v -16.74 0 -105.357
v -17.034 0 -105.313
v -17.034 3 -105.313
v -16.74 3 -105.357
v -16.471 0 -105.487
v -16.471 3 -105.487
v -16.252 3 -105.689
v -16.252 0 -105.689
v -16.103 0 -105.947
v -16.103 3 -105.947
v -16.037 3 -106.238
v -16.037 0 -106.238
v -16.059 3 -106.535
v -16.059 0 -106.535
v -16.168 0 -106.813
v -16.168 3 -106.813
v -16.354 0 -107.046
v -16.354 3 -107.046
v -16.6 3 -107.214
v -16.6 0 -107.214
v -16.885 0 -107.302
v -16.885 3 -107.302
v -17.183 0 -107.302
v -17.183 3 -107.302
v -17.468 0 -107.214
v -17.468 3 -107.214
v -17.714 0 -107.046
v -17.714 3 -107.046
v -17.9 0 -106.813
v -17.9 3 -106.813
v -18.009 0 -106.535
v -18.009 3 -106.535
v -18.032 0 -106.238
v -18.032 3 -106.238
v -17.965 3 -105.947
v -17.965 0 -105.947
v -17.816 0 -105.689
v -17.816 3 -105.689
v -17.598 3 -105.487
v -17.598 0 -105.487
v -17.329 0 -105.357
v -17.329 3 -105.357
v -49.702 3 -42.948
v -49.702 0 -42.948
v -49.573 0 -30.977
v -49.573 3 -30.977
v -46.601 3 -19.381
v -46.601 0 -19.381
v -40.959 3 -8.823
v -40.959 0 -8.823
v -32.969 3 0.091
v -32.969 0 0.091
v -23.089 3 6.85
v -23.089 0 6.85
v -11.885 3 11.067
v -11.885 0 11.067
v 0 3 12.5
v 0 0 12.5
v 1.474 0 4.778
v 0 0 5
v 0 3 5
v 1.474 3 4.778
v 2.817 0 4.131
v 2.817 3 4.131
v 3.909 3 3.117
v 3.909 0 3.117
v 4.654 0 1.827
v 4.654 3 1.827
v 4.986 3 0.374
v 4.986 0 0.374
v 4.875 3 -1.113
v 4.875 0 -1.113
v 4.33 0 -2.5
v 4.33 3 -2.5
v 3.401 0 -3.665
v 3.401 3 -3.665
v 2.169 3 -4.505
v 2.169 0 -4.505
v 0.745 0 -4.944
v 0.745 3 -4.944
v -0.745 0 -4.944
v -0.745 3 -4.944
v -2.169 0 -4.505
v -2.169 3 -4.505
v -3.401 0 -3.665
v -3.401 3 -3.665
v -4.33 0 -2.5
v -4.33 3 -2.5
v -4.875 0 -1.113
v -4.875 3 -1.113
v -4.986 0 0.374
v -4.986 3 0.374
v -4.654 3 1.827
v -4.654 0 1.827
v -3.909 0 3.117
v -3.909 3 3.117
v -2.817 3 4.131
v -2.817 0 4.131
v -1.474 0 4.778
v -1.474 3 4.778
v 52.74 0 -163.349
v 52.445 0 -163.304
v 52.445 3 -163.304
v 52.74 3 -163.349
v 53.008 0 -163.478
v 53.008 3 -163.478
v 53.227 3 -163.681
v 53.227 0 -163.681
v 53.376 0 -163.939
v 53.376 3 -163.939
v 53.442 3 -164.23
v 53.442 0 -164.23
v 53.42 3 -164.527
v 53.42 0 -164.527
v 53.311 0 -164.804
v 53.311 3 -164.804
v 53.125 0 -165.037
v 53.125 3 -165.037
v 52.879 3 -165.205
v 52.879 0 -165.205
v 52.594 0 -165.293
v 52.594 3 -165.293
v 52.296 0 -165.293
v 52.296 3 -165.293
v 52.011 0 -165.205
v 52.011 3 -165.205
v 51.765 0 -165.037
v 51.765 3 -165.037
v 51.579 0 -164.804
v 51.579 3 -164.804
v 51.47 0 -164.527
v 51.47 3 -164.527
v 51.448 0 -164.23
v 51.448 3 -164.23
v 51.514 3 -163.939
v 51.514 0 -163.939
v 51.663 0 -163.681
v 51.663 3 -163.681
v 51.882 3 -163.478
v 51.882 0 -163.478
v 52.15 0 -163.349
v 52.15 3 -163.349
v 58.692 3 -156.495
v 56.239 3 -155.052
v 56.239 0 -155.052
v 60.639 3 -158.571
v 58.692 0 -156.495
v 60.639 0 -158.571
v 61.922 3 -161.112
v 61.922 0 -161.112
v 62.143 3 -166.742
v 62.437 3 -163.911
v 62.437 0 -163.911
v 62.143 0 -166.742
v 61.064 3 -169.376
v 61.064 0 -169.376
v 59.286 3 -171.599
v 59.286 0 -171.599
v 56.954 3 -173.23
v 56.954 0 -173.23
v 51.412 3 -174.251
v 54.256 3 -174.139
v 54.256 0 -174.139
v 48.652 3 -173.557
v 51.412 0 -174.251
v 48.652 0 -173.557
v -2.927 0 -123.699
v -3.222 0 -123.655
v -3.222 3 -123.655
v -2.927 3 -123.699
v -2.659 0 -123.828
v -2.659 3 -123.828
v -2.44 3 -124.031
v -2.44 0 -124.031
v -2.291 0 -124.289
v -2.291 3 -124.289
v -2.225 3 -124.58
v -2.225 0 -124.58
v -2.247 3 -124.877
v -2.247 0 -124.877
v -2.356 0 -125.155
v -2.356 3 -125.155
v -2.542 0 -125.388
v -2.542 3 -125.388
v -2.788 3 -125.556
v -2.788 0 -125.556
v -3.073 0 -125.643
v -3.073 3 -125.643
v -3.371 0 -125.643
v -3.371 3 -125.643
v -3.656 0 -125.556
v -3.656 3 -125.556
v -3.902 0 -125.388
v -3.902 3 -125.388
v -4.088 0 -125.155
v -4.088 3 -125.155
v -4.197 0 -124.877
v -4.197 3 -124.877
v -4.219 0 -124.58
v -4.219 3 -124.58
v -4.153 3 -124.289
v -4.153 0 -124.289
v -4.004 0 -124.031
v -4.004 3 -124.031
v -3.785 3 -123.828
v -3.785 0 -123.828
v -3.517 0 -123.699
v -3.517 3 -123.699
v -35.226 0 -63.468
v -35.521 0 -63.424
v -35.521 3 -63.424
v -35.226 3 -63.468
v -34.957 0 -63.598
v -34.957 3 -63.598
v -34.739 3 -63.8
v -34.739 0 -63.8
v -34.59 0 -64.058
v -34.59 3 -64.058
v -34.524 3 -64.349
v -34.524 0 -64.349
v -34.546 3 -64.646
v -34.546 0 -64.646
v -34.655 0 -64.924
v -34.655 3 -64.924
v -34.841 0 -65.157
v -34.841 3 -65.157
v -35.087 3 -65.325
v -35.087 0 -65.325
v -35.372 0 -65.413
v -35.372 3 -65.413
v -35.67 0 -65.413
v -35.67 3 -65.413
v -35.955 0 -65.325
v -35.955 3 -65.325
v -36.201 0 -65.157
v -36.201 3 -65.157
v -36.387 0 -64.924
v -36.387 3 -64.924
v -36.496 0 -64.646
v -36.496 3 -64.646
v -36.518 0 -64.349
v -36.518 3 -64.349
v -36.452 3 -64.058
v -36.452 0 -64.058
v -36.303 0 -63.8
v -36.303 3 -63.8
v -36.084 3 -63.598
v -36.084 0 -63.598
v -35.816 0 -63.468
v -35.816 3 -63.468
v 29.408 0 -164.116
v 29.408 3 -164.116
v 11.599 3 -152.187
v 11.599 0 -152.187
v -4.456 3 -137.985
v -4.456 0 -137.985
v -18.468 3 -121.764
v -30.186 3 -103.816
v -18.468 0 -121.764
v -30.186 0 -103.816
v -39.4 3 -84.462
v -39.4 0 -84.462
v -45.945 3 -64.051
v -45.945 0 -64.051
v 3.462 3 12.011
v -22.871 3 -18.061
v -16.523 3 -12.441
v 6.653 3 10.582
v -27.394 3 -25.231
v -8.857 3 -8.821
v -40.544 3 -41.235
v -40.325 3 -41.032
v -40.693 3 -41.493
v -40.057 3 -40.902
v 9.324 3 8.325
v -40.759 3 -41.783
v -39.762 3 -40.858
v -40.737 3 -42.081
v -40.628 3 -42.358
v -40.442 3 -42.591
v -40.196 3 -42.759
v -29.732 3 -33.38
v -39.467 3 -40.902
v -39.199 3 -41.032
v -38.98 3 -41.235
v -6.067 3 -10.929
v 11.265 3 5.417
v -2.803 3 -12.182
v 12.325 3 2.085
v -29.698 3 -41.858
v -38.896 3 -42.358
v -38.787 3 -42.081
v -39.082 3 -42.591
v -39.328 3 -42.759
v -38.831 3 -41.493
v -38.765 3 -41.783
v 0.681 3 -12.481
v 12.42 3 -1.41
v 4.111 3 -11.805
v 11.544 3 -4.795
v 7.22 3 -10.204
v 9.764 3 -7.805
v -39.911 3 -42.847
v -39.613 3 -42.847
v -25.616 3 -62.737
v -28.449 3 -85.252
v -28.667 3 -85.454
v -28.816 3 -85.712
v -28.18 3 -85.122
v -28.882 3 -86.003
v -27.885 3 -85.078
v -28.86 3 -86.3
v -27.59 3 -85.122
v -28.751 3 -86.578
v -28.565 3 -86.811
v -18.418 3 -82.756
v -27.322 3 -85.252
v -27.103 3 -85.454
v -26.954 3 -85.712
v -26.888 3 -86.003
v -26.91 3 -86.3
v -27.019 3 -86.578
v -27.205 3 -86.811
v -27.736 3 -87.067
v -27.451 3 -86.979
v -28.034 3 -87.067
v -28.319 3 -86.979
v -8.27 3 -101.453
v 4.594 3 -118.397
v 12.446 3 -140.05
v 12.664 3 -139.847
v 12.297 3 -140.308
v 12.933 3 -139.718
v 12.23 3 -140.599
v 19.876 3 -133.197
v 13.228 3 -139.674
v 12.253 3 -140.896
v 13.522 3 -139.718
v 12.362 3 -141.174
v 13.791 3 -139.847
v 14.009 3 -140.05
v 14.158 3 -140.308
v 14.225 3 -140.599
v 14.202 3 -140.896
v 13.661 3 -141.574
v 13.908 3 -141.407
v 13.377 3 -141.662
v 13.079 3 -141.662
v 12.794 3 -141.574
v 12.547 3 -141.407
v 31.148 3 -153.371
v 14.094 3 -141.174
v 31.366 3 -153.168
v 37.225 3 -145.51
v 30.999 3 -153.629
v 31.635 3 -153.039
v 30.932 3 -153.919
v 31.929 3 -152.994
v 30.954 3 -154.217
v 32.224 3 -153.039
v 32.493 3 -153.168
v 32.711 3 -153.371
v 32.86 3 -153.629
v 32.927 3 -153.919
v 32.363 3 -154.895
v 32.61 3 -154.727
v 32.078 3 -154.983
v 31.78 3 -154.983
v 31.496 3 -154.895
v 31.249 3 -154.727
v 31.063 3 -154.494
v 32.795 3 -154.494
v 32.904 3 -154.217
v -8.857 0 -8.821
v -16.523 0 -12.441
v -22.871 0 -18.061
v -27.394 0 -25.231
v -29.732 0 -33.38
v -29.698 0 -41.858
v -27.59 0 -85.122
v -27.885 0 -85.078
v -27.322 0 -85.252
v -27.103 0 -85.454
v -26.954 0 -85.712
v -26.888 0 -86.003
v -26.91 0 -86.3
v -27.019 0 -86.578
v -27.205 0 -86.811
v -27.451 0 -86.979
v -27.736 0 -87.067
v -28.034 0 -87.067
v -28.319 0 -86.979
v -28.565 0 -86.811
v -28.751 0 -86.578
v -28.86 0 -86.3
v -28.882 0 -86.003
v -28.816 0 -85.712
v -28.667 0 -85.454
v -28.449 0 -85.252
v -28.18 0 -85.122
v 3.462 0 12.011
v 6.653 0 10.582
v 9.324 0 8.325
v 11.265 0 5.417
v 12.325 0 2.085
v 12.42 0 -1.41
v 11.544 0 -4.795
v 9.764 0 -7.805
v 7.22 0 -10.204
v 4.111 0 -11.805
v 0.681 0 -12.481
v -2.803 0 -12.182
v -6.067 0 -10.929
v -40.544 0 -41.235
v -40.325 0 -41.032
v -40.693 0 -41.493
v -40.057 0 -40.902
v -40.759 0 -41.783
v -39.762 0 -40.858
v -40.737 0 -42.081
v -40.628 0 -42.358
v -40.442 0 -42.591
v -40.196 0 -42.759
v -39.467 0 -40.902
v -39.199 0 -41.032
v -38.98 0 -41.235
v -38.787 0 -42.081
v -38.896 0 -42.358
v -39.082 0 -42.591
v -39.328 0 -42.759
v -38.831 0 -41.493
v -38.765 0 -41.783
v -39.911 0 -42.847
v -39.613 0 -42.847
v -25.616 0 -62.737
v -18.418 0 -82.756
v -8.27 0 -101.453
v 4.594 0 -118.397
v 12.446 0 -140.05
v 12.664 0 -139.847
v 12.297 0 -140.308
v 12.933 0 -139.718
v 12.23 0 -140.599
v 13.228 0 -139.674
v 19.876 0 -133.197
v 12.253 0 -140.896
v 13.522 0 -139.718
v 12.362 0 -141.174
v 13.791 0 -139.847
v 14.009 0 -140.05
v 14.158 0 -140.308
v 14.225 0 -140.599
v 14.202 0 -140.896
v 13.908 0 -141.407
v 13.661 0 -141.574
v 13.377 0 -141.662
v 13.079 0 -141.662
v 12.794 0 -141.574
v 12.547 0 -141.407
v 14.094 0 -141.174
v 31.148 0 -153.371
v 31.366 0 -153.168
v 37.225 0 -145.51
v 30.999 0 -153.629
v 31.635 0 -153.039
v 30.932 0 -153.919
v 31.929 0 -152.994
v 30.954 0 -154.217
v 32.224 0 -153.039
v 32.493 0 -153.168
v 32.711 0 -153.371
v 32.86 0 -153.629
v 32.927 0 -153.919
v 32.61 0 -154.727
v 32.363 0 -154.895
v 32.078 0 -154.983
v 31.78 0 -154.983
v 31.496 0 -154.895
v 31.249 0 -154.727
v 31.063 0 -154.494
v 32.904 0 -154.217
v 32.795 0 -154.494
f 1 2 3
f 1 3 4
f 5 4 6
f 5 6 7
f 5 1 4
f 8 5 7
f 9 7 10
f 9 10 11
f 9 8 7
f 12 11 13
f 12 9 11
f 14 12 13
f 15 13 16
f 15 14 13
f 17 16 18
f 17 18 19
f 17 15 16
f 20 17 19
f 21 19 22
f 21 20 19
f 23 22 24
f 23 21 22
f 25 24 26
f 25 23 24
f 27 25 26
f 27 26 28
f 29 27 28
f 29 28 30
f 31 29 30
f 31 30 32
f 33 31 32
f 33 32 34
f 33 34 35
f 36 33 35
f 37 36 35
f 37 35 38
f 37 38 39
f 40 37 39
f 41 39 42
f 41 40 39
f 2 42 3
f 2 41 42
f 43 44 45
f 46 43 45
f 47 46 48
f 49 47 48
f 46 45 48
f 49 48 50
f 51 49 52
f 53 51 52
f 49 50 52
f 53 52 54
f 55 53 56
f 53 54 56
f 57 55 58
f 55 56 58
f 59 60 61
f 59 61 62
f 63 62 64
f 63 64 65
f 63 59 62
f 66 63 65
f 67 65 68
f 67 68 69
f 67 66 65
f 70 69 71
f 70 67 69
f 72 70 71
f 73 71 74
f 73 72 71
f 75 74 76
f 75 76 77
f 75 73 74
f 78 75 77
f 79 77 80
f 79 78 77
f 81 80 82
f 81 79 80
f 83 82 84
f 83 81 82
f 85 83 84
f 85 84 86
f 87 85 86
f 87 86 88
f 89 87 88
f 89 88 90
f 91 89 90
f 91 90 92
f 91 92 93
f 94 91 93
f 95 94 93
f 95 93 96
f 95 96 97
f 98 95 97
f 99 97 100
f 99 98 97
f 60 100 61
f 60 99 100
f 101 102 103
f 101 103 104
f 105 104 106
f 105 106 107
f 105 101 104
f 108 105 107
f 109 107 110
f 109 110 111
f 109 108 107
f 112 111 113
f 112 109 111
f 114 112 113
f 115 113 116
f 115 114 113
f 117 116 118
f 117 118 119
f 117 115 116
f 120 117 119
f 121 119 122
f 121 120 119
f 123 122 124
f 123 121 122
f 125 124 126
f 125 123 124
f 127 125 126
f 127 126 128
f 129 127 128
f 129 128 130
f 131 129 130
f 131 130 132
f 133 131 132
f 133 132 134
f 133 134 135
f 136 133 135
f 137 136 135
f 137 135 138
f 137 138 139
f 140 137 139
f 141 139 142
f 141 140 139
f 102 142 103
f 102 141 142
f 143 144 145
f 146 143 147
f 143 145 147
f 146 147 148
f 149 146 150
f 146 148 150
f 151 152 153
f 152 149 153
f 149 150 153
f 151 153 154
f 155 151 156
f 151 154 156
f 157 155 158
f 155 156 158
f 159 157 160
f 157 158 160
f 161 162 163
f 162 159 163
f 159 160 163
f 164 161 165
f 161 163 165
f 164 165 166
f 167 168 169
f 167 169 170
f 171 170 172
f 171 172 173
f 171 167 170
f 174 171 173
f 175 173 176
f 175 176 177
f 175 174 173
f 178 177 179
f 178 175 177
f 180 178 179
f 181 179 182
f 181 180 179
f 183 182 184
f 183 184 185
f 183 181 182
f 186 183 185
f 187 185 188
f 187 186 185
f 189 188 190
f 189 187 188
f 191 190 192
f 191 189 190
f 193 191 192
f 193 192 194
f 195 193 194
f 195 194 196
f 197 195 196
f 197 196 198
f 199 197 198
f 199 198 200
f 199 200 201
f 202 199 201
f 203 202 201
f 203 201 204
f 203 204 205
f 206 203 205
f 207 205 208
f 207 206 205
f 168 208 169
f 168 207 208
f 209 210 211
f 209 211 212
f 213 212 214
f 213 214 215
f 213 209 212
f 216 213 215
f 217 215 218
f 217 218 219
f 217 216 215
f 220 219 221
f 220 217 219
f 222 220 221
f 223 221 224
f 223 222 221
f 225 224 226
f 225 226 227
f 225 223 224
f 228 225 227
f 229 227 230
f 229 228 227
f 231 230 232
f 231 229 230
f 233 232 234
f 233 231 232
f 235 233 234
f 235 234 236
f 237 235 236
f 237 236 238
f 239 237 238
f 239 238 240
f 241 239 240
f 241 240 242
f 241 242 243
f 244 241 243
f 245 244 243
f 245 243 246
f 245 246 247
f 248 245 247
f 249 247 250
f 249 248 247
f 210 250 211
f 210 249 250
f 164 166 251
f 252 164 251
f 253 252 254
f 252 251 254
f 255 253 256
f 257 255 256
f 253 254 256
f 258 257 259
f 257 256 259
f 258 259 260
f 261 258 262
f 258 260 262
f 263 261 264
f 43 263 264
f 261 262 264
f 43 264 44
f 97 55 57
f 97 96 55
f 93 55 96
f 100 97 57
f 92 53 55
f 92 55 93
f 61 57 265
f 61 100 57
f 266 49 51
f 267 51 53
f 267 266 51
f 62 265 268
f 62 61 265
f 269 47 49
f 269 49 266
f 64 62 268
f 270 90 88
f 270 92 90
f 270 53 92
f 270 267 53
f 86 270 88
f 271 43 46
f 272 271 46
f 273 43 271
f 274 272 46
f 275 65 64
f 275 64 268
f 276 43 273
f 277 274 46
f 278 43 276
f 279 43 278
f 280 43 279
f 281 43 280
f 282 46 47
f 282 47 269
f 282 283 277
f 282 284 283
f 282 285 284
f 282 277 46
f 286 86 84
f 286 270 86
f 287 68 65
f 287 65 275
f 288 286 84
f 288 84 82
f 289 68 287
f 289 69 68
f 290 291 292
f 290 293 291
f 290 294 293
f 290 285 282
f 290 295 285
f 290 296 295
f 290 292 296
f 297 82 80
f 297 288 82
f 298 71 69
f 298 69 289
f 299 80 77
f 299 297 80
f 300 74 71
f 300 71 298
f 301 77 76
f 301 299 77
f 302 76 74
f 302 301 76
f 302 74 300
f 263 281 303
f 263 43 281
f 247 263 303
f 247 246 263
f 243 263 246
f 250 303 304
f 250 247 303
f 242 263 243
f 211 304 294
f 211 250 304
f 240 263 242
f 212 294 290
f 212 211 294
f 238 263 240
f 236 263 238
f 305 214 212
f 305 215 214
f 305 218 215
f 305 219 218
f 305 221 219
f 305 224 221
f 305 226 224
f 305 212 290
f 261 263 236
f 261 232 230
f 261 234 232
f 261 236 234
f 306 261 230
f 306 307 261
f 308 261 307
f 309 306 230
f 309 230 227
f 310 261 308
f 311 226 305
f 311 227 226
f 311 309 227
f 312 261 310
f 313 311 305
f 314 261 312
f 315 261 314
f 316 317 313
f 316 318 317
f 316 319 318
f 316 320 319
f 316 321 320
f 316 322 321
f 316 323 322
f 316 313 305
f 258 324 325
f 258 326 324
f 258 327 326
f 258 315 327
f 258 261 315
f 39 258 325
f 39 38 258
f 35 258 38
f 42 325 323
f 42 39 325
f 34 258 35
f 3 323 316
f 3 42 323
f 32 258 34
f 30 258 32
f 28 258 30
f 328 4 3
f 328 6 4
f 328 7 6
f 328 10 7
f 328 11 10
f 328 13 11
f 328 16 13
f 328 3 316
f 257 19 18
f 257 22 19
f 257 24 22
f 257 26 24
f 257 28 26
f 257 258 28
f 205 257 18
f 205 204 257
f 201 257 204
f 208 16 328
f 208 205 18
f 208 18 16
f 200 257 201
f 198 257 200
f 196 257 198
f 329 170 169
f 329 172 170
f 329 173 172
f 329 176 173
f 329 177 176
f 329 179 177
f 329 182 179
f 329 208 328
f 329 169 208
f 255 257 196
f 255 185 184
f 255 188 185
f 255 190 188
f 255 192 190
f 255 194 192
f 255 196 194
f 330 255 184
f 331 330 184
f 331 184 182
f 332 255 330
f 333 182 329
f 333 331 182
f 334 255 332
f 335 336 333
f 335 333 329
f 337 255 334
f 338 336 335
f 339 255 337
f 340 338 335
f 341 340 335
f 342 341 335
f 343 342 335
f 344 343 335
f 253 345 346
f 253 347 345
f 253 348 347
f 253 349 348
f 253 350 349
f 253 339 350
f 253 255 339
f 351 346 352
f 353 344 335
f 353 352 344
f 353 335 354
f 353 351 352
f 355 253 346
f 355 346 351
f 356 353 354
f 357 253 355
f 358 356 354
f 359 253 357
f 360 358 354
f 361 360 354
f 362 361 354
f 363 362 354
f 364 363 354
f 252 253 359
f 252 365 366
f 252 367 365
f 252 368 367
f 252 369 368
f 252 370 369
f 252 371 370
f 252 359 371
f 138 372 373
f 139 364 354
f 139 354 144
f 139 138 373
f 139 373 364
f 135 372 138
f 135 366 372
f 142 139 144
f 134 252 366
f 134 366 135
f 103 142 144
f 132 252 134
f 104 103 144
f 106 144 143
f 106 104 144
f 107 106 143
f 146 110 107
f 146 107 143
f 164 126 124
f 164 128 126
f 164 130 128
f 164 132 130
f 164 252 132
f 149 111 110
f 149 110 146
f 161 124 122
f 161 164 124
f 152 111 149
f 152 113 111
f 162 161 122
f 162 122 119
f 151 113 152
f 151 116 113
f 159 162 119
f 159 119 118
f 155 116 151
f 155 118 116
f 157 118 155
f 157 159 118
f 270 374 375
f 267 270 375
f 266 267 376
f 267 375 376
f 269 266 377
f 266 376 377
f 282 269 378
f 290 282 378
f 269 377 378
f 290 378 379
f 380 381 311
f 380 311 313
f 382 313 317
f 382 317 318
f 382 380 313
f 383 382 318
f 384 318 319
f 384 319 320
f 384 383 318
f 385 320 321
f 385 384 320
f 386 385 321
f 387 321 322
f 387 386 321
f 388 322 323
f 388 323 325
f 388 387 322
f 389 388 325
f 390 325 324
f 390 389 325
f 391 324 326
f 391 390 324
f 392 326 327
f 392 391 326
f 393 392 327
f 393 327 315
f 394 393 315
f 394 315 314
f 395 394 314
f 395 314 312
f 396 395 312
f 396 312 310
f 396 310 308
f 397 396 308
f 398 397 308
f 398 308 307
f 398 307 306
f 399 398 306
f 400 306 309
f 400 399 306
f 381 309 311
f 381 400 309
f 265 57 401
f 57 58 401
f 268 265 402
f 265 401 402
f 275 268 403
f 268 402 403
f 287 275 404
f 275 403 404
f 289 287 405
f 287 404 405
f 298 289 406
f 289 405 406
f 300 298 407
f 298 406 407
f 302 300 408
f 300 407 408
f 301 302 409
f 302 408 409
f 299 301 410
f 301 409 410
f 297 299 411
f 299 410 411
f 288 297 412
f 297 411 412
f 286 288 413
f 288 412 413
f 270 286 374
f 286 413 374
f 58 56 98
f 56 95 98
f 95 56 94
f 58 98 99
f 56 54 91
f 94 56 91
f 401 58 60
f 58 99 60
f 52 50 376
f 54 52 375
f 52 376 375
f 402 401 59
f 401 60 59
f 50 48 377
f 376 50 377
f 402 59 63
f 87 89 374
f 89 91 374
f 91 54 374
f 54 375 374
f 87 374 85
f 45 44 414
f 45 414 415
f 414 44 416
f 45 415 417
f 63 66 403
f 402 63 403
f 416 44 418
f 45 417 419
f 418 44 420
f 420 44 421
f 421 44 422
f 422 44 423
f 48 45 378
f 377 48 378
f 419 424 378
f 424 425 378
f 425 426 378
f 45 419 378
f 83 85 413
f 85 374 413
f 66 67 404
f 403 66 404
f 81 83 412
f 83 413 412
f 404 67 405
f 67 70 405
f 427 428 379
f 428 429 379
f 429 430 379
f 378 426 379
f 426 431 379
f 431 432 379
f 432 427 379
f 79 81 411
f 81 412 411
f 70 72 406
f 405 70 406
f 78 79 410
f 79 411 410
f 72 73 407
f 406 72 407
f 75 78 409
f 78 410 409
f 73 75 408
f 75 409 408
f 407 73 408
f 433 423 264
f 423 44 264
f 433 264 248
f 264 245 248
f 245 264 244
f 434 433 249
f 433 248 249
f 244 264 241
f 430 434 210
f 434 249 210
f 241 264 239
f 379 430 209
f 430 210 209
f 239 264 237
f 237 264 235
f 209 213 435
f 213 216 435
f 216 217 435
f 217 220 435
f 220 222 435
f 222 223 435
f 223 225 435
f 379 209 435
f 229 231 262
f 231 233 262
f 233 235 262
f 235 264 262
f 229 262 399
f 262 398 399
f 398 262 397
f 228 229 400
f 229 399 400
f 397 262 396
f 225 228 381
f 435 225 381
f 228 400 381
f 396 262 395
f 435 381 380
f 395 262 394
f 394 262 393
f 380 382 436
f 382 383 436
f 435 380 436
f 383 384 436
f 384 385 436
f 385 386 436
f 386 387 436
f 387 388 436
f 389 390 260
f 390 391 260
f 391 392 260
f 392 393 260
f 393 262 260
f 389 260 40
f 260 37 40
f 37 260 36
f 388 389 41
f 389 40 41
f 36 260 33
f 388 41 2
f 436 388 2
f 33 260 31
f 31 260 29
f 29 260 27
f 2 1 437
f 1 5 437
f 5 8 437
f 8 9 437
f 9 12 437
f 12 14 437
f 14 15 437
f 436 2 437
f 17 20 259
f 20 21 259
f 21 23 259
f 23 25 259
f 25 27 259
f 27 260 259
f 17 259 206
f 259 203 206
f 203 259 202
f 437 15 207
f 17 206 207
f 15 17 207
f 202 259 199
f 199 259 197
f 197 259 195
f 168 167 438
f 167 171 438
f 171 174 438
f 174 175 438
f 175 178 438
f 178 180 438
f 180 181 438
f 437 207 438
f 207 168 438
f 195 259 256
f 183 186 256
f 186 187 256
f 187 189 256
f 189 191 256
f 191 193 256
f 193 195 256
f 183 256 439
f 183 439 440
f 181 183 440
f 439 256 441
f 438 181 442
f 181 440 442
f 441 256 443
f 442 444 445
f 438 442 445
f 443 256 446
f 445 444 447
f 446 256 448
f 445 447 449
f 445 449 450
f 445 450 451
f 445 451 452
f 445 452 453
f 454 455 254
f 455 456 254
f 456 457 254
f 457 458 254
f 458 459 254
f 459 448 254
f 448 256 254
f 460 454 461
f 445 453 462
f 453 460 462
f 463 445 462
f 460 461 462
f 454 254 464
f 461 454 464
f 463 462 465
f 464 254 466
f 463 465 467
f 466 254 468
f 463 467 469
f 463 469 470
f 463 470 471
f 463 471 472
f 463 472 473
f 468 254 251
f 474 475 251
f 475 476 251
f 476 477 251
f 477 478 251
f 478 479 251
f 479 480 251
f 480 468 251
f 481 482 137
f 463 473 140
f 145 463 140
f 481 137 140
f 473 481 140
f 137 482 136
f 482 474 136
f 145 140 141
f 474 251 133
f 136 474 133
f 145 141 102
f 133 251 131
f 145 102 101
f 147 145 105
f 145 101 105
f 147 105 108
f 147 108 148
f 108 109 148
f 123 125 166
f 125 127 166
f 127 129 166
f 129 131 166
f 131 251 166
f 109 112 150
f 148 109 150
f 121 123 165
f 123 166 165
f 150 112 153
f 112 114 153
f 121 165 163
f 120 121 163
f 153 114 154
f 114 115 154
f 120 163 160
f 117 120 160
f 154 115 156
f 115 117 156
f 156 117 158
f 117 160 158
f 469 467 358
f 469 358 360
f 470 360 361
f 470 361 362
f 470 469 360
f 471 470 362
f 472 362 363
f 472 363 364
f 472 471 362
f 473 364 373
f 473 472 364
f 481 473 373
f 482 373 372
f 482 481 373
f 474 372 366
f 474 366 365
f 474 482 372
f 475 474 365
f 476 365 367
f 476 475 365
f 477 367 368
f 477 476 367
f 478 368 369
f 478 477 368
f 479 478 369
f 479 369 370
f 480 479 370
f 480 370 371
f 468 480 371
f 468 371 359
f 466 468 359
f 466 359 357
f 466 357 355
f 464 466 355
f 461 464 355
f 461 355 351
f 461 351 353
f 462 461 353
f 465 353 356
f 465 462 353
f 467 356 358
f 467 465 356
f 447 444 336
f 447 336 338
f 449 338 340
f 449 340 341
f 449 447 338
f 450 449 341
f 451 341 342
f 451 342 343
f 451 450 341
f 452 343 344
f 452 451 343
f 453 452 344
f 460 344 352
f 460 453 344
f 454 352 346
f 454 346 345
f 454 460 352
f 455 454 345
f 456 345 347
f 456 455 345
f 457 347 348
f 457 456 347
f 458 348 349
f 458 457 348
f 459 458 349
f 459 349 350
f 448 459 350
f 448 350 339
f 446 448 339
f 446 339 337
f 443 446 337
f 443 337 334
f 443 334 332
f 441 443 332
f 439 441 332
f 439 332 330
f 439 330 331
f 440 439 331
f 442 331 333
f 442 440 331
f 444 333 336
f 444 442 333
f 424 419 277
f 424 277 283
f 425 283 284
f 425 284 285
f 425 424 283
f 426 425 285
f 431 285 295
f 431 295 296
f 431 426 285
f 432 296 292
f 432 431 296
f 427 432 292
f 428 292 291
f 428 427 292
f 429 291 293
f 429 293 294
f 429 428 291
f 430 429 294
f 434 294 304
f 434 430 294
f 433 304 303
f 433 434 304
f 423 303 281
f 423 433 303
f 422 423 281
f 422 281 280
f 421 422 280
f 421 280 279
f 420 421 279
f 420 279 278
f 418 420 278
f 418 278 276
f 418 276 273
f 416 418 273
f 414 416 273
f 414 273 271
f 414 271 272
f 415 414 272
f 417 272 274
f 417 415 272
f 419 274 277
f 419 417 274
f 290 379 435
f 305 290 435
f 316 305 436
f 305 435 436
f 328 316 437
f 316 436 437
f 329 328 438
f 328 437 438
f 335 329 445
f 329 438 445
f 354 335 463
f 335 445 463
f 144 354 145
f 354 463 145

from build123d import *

# Parameters (mm, degrees)
IZIM1_R                     = 1
IZIM1_R_2                   = 12.5
IZIM1_R_3                   = 5
IZIM1_R_4                   = 10
Y_KSEKLIK_EKSTR_ZYON1_DEPTH = 3


with BuildPart() as part:
    # Çizim1 → Yükseklik-Ekstrüzyon1 (new body)
    # profile 1 of 3: a face of its own
    with BuildSketch(Plane(origin=(0, 0, 0), x_dir=(1, 0, 0), z_dir=(0, 1, 0))):
        with BuildLine():
            ThreePointArc((0, -12.5), (-11.543595981, -4.795351063), (-8.856895242, 8.820737309))
            ThreePointArc((-8.856895242, 8.820737309), (-25.386606646, 21.485478314), (-29.697678368, 41.85805018))
            ThreePointArc((-29.697678368, 41.85805018), (-2.160717, 110.170160276), (56.238508843, 155.051771745))
            ThreePointArc((56.238508843, 155.051771745), (43.192574473, 160.511038766), (48.651841494, 173.556973137))
            ThreePointArc((48.651841494, 173.556973137), (-18.46803273, 121.763907855), (-49.702354676, 42.947562724))
            ThreePointArc((-49.702354676, 42.947562724), (-37.231560108, 4.126193926), (0, -12.5))
        make_face()
        with Locations(Location((-39.761883741, 41.85805018, 0), (0, 0, 270))):
            Circle(IZIM1_R, mode=Mode.SUBTRACT)
        with Locations(Location((-35.520748055, 64.423751915, 0), (0, 0, 270))):
            Circle(IZIM1_R, mode=Mode.SUBTRACT)
        with Locations(Location((-27.885254768, 86.077790082, 0), (0, 0, 270))):
            Circle(IZIM1_R, mode=Mode.SUBTRACT)
        with Locations(Location((-17.034311334, 106.31278831, 0), (0, 0, 270))):
            Circle(IZIM1_R, mode=Mode.SUBTRACT)
        with Locations(Location((-3.222166513, 124.654619792, 0), (0, 0, 270))):
            Circle(IZIM1_R, mode=Mode.SUBTRACT)
        with Locations(Location((13.227546947, 140.673516564, 0), (0, 0, 270))):
            Circle(IZIM1_R, mode=Mode.SUBTRACT)
        with Locations(Location((31.929395352, 153.994139408, 0), (0, 0, 270))):
            Circle(IZIM1_R, mode=Mode.SUBTRACT)
    # profile 2 of 3: a face of its own
    with BuildSketch(Plane(origin=(0, 0, 0), x_dir=(1, 0, 0), z_dir=(0, 1, 0))):
        Circle(IZIM1_R_2)
        with Locations(Location((0, 0, 0), (0, 0, 270))):
            Circle(IZIM1_R_3, mode=Mode.SUBTRACT)
    # profile 3 of 3: a face of its own
    with BuildSketch(Plane(origin=(0, 0, 0), x_dir=(1, 0, 0), z_dir=(0, 1, 0))):
        with Locations((52.445175169, 164.304372441)):
            Circle(IZIM1_R_4)
        with Locations(Location((52.445175169, 164.304372441, 0), (0, 0, 270))):
            Circle(IZIM1_R, mode=Mode.SUBTRACT)
    extrude(amount=Y_KSEKLIK_EKSTR_ZYON1_DEPTH)


solid = part.part
